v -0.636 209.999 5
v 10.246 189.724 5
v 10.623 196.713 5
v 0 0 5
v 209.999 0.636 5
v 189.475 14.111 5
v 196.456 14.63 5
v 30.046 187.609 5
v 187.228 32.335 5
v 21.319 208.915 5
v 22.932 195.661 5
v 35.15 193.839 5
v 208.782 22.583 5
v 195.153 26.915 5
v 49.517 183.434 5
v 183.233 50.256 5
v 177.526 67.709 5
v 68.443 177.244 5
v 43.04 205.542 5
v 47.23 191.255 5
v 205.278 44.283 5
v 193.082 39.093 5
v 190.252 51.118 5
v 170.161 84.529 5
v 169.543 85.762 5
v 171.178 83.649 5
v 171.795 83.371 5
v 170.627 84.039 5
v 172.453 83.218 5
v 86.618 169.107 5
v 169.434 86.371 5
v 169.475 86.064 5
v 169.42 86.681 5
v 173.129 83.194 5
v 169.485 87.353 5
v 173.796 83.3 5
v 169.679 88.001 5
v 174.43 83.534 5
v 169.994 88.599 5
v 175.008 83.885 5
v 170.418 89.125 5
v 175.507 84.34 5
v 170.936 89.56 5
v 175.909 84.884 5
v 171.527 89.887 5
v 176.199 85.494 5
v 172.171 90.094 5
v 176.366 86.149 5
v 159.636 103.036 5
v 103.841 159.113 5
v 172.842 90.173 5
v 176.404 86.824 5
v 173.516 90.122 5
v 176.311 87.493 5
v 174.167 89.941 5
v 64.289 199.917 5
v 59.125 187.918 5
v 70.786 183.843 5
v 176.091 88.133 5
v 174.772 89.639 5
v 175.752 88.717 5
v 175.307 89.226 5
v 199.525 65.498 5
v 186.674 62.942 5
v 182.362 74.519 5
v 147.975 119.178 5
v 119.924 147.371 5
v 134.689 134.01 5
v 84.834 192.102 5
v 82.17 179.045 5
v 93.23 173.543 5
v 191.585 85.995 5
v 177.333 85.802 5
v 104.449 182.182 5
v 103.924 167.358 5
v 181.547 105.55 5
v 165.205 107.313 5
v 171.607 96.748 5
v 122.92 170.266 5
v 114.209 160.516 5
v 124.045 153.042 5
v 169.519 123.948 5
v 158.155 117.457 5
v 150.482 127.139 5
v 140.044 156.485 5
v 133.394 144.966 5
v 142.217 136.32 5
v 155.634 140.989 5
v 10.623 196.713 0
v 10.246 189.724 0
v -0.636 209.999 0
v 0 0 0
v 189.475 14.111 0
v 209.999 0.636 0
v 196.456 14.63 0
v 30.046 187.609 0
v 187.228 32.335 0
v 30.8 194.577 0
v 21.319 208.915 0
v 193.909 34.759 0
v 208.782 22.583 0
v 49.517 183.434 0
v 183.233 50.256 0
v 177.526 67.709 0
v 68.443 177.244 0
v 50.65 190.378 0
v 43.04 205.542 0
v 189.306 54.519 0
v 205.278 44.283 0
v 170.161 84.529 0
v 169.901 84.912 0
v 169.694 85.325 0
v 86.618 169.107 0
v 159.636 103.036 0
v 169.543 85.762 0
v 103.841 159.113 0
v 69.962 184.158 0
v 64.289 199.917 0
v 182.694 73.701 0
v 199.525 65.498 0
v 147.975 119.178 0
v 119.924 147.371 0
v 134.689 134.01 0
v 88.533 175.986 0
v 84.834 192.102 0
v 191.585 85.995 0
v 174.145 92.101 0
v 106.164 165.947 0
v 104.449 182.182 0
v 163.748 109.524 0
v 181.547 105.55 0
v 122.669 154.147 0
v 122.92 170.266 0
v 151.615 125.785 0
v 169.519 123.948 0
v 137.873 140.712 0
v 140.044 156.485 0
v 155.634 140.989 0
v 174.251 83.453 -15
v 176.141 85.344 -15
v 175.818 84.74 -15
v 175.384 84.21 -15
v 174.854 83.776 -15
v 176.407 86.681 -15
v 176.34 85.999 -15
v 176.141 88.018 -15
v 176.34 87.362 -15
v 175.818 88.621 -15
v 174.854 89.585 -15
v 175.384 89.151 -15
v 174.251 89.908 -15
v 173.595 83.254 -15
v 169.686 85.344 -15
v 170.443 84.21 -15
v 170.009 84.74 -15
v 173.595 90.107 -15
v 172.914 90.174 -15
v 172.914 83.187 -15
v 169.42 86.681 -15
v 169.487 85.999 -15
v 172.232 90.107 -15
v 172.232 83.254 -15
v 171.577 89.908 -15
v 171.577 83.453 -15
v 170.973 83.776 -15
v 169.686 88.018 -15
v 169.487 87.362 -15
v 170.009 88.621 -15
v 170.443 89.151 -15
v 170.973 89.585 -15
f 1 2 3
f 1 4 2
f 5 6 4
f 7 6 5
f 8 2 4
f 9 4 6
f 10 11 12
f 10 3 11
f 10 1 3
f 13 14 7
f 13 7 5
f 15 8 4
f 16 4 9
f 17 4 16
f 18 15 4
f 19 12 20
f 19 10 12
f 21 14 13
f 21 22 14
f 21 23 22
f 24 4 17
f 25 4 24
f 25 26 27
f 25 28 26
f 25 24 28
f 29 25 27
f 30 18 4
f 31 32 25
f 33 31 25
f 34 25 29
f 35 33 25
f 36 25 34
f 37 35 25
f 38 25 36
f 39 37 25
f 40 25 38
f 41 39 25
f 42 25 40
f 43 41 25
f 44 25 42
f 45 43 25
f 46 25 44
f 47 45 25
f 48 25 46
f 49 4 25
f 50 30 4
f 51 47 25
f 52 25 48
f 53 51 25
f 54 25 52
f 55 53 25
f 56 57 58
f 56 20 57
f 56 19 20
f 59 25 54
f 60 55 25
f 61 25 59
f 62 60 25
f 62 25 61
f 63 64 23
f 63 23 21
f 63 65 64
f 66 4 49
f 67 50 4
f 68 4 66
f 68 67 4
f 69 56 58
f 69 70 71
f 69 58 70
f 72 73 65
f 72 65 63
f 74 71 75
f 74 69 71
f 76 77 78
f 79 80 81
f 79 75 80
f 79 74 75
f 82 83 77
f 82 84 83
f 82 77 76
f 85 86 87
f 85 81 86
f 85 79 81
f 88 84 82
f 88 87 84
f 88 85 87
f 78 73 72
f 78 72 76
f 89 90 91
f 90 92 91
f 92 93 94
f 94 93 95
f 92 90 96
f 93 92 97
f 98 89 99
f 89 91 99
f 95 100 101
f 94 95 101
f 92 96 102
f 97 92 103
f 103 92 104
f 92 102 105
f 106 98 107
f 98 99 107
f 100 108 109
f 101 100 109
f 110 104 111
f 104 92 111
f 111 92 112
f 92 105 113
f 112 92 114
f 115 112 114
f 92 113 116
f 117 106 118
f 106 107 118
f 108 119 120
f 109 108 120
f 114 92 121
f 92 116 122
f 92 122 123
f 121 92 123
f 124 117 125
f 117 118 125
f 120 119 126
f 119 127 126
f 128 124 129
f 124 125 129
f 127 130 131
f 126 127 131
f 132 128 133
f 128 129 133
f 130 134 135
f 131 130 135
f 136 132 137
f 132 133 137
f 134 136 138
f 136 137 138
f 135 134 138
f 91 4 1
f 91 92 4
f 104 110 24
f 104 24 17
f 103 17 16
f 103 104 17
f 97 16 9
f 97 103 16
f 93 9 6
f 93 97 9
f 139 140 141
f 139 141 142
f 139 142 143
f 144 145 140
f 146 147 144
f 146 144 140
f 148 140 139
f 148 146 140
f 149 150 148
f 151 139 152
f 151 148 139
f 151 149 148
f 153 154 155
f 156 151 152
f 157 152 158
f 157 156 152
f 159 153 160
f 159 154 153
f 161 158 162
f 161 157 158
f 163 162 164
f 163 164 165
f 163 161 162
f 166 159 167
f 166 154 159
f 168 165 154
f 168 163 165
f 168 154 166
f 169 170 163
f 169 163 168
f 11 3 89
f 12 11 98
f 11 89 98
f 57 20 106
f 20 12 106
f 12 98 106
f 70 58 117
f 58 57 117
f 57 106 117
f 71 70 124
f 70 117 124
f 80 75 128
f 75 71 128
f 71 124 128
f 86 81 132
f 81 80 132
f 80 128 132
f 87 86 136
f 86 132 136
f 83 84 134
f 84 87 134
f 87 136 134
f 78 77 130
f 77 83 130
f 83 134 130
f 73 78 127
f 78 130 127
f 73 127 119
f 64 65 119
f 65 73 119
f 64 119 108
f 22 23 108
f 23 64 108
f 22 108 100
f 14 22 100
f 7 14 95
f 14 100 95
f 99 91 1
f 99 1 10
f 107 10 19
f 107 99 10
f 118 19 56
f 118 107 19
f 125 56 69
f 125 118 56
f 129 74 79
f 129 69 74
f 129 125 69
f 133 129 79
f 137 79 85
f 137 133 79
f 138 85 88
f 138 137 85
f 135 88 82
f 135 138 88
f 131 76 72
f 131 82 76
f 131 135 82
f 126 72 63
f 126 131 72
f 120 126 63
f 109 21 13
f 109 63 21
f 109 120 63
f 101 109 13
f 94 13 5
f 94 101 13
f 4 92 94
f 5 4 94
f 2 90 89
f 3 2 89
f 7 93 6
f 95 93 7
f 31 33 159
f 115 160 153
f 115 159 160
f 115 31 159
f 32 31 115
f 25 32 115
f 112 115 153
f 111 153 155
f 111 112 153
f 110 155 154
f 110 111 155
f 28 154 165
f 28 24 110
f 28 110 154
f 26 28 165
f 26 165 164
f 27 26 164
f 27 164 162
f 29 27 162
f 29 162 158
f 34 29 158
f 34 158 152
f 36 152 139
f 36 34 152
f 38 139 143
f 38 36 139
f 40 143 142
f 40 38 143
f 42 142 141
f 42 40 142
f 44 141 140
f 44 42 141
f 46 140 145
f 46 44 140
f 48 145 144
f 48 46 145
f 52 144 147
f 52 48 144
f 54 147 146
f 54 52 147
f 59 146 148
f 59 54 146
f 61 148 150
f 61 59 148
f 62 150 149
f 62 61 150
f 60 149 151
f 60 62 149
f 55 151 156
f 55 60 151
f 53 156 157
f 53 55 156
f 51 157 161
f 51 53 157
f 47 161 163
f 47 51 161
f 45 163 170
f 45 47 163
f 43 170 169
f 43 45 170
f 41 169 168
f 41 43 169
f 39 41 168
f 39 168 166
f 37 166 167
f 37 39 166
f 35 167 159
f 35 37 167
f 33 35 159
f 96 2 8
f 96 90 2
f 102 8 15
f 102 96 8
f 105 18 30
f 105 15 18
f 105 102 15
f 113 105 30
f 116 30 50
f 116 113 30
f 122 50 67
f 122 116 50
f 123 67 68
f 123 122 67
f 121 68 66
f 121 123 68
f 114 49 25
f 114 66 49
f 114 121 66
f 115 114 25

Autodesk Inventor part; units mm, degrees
ref_plane "YZ Plane" through (0, 0, 0) normal (1, 0, 0) x (0, 1, 0)
ref_plane "XZ Plane" through (0, 0, 0) normal (0, 1, 0) x (-1, 0, 0)
ref_plane "XY Plane" through (0, 0, 0) normal (0, 0, 1) x (1, 0, 0)
sketch "Esboço1" plane through (0, 0, 0) normal (0, 0, 1) x (1, 0, 0)
  arc A0 (189.4753, 14.1106) -> (10.246, 189.7235) centre (0, 0) ccw
  line L0 (0, 0) -> (-0.575, 189.9991) construction
  line L1 (0, 0) -> (189.9991, 0.575) construction
  arc A1 (196.456, 14.6304) -> (10.6234, 196.7134) centre (0, 0) ccw
  arc A2 (209.999, 0.6355) -> (-0.6355, 209.999) centre (0, 0) ccw
  line L2 (0, 0) -> (-0.6355, 209.999)
  line L3 (0, 0) -> (209.999, 0.6355)
  line L4 (10.246, 189.7235) -> (10.6234, 196.7134)
  line L5 (189.4753, 14.1106) -> (196.456, 14.6304)
  dimension "d3" = 190
  dimension "d4" = 90
  dimension "d5" = 197
  dimension "d6" = 210
extrude "Extrusão1" add sketch "Esboço1" along normal blind 5
sketch "Esboço2" plane through (0, 0, 0) normal (0, 0, -1) x (-1, 0, 0)
  line L0 (0.6355, 209.999) -> (0, 0) projected
  circle A0 centre (-172.9136, 86.6806) radius 3.4935
extrude "Extrusão2" add sketch "Esboço2" along normal blind 20 and the other way blind 5
thread "Rosca1" size "M7x1" class "6g" standard "ANSI Metric M Profile" full length
move faces "Mover1" translate (0, 0, 5) faces at (171.993, 86.7732, -20)
properties part number "arco base"
